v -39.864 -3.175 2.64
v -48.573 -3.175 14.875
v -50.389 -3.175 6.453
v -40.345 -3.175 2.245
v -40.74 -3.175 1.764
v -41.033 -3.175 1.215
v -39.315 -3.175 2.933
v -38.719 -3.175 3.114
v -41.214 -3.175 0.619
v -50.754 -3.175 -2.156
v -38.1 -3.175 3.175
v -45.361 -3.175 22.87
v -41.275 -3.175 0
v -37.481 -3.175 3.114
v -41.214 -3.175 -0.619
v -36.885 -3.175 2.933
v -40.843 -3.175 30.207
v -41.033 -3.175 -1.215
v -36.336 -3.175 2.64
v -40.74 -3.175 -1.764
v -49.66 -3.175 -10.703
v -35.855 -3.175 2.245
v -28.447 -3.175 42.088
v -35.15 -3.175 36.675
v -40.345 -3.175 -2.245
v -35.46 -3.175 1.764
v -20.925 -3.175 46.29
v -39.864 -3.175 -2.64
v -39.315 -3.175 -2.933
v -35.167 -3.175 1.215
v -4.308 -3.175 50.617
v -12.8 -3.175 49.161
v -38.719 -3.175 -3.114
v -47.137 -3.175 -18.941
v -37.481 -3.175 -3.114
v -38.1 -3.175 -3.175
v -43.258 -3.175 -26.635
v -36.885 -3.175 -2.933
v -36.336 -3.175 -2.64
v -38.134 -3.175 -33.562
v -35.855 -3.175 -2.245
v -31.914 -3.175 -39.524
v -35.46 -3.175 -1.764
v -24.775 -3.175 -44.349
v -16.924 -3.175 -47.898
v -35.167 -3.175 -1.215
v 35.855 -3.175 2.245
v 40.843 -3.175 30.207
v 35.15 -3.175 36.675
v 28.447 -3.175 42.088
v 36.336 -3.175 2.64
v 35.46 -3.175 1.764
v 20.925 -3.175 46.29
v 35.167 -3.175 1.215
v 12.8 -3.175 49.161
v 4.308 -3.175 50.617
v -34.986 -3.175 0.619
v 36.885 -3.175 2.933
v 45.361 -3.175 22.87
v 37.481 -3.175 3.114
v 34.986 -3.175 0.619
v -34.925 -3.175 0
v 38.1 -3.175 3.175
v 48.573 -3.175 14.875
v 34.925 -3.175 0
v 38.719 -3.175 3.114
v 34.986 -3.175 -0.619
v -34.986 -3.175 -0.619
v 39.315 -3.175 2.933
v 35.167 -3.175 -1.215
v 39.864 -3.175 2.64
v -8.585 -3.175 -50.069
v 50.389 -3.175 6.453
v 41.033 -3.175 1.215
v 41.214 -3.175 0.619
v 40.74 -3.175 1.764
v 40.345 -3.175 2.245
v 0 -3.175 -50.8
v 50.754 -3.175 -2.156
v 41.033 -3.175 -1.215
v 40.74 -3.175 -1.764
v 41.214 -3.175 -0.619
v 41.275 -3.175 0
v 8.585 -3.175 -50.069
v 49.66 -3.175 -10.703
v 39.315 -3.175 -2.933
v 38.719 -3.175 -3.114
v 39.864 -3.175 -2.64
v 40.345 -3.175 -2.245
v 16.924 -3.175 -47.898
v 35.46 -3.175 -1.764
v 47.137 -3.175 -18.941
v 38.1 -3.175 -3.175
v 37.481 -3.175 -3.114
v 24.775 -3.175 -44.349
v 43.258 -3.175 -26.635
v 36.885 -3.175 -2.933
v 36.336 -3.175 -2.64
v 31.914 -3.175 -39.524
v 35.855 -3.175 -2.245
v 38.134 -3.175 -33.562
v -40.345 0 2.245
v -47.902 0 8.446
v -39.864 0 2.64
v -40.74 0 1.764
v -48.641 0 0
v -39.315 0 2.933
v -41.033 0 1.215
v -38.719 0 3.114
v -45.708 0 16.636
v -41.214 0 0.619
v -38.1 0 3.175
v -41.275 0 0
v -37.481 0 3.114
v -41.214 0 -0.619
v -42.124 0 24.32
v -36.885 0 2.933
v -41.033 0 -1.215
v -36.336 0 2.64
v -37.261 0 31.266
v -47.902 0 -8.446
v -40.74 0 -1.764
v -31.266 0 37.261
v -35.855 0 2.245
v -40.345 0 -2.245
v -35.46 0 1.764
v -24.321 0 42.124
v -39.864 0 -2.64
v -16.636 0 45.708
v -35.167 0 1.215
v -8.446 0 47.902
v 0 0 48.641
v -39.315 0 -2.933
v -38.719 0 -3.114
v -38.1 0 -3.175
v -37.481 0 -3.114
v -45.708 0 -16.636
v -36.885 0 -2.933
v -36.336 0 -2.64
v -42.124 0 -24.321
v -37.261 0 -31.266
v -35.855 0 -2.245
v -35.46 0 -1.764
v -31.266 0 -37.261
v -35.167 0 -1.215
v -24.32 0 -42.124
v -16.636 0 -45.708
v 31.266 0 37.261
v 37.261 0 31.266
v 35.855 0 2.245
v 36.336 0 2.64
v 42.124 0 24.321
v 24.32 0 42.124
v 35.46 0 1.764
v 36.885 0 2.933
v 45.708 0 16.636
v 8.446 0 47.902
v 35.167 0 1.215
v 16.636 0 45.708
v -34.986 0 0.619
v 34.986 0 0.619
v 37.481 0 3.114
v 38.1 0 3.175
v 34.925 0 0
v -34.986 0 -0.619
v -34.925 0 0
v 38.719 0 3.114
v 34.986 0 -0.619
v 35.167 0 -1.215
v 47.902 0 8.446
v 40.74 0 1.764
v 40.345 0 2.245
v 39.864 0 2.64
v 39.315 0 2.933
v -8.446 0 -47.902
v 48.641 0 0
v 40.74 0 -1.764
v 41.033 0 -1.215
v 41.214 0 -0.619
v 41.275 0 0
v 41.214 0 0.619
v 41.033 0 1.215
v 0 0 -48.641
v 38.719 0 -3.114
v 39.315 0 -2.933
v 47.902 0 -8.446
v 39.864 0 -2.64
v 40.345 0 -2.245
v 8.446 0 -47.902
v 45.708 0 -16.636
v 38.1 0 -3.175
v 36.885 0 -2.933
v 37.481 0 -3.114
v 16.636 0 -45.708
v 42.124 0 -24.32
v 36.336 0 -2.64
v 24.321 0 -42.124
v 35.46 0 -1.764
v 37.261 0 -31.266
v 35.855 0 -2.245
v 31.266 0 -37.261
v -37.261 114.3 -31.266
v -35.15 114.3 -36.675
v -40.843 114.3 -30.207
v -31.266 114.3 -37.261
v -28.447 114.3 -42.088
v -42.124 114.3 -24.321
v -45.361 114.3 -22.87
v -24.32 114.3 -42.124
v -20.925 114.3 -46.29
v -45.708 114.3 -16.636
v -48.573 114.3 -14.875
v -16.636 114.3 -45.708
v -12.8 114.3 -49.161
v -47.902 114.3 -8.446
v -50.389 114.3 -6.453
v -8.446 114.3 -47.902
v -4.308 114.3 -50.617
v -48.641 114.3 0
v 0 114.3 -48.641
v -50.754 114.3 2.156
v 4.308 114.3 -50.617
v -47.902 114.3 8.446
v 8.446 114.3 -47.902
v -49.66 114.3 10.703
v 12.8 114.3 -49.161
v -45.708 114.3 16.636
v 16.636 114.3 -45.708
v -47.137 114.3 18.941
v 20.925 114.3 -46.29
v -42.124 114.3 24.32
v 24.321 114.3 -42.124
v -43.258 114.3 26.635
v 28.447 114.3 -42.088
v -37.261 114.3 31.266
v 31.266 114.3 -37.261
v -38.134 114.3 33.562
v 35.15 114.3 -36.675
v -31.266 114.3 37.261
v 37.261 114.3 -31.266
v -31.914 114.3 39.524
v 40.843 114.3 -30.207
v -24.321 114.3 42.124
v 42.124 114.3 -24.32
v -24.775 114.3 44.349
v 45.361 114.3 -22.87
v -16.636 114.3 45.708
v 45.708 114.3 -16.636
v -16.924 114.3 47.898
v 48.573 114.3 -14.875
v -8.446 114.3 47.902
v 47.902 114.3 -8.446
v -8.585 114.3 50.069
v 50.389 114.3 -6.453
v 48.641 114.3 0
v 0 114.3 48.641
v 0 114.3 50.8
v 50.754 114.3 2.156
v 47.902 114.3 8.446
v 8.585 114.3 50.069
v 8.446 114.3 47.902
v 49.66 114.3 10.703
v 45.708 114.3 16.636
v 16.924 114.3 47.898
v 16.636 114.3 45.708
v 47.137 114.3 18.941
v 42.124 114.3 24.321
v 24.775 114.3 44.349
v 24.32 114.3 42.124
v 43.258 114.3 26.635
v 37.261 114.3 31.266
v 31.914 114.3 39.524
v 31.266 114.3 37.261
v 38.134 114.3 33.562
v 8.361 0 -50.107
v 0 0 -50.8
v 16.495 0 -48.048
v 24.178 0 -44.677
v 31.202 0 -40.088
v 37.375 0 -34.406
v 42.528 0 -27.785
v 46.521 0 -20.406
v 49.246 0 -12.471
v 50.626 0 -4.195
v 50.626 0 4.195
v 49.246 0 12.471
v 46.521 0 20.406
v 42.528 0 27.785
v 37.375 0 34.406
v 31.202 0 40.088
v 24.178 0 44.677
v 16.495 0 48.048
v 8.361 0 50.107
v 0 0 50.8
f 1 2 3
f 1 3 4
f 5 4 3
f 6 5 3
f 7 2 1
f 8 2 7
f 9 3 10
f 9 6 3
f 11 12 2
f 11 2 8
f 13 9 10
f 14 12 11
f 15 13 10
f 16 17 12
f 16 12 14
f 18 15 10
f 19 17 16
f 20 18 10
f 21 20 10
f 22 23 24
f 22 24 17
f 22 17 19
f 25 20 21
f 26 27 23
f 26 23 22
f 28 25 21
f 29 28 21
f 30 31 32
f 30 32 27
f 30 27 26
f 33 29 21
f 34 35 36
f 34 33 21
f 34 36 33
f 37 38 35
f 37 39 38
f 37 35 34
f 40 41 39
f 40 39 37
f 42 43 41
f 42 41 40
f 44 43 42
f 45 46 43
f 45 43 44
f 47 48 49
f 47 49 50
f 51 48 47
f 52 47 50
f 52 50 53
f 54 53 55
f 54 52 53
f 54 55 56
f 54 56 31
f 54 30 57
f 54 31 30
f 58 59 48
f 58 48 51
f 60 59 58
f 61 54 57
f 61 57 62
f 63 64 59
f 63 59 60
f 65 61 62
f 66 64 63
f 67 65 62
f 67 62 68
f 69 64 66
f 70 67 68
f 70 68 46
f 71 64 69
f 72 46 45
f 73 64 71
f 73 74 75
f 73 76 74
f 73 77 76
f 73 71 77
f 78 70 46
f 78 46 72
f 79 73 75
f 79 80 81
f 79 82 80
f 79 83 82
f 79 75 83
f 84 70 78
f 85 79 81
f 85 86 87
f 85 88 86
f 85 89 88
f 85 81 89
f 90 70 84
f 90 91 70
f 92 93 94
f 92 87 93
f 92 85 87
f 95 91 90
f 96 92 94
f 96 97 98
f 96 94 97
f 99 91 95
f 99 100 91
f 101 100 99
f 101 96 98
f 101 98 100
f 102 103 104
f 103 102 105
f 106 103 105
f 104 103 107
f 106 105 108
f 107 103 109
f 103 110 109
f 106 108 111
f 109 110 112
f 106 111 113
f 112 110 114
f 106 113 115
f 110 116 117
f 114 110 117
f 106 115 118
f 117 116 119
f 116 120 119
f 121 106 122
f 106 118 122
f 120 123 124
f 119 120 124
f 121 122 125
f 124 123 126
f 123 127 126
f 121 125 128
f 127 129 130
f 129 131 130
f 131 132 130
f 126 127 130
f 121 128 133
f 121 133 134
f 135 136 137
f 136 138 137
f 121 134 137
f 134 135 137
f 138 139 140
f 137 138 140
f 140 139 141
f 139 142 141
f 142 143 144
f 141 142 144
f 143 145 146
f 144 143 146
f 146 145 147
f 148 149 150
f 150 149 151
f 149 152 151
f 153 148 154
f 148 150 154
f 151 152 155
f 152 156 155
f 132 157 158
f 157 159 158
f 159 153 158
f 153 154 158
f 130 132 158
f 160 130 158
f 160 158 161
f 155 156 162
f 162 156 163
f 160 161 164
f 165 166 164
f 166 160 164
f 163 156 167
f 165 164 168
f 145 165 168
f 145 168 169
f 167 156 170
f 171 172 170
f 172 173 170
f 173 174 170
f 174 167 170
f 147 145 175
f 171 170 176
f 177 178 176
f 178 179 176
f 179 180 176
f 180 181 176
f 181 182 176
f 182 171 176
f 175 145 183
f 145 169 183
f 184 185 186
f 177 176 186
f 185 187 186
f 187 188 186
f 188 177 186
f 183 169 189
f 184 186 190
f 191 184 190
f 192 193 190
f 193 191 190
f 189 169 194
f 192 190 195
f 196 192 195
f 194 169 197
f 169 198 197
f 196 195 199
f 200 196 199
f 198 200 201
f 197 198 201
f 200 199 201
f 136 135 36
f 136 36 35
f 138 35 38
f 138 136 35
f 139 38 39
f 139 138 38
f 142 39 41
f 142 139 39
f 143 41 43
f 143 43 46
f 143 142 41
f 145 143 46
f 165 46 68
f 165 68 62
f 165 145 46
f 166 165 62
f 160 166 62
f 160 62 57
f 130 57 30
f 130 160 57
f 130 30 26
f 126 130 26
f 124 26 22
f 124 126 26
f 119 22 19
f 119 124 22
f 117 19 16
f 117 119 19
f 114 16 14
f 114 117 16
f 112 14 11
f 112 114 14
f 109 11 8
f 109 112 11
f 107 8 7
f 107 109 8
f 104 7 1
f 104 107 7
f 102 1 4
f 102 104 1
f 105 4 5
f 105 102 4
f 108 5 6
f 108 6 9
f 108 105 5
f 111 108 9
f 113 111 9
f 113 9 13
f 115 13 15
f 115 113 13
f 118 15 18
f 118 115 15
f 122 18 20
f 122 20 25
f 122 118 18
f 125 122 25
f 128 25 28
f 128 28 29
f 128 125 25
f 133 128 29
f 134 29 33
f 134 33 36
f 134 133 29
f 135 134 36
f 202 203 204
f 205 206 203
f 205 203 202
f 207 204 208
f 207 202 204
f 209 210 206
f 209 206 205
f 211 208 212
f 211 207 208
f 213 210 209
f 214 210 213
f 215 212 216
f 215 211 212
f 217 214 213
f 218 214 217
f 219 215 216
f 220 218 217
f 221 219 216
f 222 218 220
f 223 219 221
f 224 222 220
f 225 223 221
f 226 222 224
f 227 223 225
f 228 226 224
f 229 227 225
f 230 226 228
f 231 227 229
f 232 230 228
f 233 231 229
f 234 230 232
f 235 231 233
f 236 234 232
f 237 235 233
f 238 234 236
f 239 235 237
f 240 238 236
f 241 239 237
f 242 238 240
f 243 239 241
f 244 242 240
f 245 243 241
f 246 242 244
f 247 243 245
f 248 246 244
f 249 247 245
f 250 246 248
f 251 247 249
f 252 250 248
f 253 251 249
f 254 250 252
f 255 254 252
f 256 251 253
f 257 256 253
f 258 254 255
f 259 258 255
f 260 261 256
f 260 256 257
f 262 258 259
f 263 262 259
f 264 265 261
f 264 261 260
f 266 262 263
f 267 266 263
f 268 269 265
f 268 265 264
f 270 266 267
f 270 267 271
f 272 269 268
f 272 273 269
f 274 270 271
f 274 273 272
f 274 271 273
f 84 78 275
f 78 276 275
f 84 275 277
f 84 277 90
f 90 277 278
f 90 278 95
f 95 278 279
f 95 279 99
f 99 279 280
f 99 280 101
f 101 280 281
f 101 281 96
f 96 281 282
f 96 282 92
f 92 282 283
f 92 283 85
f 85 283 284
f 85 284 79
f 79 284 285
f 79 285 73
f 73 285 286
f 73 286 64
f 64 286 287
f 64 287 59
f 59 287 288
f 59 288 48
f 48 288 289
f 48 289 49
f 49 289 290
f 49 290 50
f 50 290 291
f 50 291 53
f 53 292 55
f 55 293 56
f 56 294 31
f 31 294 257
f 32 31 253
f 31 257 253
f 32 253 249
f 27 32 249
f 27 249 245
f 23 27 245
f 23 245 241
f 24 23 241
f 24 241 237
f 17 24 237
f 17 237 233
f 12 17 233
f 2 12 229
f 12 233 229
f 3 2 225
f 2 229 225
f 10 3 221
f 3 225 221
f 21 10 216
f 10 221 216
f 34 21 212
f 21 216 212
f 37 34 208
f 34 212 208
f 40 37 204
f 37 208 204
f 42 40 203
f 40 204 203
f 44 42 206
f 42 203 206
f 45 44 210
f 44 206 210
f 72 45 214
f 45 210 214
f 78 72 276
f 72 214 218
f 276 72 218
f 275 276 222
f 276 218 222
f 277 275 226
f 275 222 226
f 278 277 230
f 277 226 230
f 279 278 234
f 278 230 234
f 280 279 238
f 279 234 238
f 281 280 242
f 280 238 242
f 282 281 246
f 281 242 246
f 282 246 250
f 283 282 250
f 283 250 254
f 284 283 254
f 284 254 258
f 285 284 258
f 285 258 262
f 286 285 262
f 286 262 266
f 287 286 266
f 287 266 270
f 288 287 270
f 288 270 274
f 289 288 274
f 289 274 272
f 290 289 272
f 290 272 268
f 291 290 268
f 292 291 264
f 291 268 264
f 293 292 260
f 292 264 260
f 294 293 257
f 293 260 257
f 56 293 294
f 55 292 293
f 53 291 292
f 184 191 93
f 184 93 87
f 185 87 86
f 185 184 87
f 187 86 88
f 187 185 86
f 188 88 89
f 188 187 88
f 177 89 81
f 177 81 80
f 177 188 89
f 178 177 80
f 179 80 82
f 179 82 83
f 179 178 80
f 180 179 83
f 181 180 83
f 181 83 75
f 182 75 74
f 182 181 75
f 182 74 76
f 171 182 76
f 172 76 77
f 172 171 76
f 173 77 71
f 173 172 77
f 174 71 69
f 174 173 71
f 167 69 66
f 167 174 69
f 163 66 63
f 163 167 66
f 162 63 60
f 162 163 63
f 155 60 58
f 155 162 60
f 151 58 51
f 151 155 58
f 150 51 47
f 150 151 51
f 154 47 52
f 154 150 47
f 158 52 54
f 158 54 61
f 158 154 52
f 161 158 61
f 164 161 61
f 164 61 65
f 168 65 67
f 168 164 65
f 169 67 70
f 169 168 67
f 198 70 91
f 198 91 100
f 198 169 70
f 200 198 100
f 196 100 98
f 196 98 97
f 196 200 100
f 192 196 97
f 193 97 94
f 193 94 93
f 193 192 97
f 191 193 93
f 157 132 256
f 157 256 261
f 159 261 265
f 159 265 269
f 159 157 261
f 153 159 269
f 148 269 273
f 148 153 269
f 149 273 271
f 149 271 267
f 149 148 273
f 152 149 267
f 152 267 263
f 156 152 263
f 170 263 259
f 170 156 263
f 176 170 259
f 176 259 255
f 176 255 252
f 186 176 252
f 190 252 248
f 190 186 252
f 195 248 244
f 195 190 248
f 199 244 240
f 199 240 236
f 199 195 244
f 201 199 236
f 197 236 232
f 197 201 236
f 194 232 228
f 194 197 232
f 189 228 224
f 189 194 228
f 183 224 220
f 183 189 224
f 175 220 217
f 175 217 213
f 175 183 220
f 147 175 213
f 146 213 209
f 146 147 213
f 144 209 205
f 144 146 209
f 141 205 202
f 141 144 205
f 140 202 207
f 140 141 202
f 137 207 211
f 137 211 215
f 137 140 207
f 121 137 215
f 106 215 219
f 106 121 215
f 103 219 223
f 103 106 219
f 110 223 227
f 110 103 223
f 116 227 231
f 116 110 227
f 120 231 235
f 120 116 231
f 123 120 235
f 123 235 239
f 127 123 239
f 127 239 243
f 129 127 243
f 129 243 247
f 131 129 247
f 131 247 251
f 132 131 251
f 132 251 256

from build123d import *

# Parameters (mm, degrees)
SKETCH1_R           = 50.8
SKETCH1_R_2         = 48.641
BOSS_EXTRUDE1_DEPTH = 114.3
SKETCH2_R           = 50.8
SKETCH2_R_2         = 48.641
SKETCH2_R_3         = 3.175
BOSS_EXTRUDE2_DEPTH = 3.175


with BuildPart() as part:
    # Sketch1 → Boss-Extrude1 (new body)
    with BuildSketch(Plane(origin=(0, 0, 0), x_dir=(1, 0, 0), z_dir=(0, 1, 0))):
        with Locations(Location((0, 0, 0), (0, 0, 270))):
            Circle(SKETCH1_R)
        with Locations(Location((0, 0, 0), (0, 0, 270))):
            Circle(SKETCH1_R_2, mode=Mode.SUBTRACT)
    extrude(amount=BOSS_EXTRUDE1_DEPTH)

    # Sketch2 → Boss-Extrude2 (add)
    with BuildSketch(Plane.XZ):
        with Locations(Location((0, 0, 0), (0, 0, 270))):
            Circle(SKETCH2_R)
        with Locations(Location((0, 0, 0), (0, 0, 90))):
            Circle(SKETCH2_R_2, mode=Mode.SUBTRACT)
        with Locations(Location((0, 0, 0), (0, 0, 90))):
            Circle(SKETCH2_R_2)
        with Locations(Location((38.1, 0, 0), (0, 0, 270))):
            Circle(SKETCH2_R_3, mode=Mode.SUBTRACT)
        with Locations(Location((-38.1, 0, 0), (0, 0, 270))):
            Circle(SKETCH2_R_3, mode=Mode.SUBTRACT)
    extrude(amount=BOSS_EXTRUDE2_DEPTH)


solid = part.part
